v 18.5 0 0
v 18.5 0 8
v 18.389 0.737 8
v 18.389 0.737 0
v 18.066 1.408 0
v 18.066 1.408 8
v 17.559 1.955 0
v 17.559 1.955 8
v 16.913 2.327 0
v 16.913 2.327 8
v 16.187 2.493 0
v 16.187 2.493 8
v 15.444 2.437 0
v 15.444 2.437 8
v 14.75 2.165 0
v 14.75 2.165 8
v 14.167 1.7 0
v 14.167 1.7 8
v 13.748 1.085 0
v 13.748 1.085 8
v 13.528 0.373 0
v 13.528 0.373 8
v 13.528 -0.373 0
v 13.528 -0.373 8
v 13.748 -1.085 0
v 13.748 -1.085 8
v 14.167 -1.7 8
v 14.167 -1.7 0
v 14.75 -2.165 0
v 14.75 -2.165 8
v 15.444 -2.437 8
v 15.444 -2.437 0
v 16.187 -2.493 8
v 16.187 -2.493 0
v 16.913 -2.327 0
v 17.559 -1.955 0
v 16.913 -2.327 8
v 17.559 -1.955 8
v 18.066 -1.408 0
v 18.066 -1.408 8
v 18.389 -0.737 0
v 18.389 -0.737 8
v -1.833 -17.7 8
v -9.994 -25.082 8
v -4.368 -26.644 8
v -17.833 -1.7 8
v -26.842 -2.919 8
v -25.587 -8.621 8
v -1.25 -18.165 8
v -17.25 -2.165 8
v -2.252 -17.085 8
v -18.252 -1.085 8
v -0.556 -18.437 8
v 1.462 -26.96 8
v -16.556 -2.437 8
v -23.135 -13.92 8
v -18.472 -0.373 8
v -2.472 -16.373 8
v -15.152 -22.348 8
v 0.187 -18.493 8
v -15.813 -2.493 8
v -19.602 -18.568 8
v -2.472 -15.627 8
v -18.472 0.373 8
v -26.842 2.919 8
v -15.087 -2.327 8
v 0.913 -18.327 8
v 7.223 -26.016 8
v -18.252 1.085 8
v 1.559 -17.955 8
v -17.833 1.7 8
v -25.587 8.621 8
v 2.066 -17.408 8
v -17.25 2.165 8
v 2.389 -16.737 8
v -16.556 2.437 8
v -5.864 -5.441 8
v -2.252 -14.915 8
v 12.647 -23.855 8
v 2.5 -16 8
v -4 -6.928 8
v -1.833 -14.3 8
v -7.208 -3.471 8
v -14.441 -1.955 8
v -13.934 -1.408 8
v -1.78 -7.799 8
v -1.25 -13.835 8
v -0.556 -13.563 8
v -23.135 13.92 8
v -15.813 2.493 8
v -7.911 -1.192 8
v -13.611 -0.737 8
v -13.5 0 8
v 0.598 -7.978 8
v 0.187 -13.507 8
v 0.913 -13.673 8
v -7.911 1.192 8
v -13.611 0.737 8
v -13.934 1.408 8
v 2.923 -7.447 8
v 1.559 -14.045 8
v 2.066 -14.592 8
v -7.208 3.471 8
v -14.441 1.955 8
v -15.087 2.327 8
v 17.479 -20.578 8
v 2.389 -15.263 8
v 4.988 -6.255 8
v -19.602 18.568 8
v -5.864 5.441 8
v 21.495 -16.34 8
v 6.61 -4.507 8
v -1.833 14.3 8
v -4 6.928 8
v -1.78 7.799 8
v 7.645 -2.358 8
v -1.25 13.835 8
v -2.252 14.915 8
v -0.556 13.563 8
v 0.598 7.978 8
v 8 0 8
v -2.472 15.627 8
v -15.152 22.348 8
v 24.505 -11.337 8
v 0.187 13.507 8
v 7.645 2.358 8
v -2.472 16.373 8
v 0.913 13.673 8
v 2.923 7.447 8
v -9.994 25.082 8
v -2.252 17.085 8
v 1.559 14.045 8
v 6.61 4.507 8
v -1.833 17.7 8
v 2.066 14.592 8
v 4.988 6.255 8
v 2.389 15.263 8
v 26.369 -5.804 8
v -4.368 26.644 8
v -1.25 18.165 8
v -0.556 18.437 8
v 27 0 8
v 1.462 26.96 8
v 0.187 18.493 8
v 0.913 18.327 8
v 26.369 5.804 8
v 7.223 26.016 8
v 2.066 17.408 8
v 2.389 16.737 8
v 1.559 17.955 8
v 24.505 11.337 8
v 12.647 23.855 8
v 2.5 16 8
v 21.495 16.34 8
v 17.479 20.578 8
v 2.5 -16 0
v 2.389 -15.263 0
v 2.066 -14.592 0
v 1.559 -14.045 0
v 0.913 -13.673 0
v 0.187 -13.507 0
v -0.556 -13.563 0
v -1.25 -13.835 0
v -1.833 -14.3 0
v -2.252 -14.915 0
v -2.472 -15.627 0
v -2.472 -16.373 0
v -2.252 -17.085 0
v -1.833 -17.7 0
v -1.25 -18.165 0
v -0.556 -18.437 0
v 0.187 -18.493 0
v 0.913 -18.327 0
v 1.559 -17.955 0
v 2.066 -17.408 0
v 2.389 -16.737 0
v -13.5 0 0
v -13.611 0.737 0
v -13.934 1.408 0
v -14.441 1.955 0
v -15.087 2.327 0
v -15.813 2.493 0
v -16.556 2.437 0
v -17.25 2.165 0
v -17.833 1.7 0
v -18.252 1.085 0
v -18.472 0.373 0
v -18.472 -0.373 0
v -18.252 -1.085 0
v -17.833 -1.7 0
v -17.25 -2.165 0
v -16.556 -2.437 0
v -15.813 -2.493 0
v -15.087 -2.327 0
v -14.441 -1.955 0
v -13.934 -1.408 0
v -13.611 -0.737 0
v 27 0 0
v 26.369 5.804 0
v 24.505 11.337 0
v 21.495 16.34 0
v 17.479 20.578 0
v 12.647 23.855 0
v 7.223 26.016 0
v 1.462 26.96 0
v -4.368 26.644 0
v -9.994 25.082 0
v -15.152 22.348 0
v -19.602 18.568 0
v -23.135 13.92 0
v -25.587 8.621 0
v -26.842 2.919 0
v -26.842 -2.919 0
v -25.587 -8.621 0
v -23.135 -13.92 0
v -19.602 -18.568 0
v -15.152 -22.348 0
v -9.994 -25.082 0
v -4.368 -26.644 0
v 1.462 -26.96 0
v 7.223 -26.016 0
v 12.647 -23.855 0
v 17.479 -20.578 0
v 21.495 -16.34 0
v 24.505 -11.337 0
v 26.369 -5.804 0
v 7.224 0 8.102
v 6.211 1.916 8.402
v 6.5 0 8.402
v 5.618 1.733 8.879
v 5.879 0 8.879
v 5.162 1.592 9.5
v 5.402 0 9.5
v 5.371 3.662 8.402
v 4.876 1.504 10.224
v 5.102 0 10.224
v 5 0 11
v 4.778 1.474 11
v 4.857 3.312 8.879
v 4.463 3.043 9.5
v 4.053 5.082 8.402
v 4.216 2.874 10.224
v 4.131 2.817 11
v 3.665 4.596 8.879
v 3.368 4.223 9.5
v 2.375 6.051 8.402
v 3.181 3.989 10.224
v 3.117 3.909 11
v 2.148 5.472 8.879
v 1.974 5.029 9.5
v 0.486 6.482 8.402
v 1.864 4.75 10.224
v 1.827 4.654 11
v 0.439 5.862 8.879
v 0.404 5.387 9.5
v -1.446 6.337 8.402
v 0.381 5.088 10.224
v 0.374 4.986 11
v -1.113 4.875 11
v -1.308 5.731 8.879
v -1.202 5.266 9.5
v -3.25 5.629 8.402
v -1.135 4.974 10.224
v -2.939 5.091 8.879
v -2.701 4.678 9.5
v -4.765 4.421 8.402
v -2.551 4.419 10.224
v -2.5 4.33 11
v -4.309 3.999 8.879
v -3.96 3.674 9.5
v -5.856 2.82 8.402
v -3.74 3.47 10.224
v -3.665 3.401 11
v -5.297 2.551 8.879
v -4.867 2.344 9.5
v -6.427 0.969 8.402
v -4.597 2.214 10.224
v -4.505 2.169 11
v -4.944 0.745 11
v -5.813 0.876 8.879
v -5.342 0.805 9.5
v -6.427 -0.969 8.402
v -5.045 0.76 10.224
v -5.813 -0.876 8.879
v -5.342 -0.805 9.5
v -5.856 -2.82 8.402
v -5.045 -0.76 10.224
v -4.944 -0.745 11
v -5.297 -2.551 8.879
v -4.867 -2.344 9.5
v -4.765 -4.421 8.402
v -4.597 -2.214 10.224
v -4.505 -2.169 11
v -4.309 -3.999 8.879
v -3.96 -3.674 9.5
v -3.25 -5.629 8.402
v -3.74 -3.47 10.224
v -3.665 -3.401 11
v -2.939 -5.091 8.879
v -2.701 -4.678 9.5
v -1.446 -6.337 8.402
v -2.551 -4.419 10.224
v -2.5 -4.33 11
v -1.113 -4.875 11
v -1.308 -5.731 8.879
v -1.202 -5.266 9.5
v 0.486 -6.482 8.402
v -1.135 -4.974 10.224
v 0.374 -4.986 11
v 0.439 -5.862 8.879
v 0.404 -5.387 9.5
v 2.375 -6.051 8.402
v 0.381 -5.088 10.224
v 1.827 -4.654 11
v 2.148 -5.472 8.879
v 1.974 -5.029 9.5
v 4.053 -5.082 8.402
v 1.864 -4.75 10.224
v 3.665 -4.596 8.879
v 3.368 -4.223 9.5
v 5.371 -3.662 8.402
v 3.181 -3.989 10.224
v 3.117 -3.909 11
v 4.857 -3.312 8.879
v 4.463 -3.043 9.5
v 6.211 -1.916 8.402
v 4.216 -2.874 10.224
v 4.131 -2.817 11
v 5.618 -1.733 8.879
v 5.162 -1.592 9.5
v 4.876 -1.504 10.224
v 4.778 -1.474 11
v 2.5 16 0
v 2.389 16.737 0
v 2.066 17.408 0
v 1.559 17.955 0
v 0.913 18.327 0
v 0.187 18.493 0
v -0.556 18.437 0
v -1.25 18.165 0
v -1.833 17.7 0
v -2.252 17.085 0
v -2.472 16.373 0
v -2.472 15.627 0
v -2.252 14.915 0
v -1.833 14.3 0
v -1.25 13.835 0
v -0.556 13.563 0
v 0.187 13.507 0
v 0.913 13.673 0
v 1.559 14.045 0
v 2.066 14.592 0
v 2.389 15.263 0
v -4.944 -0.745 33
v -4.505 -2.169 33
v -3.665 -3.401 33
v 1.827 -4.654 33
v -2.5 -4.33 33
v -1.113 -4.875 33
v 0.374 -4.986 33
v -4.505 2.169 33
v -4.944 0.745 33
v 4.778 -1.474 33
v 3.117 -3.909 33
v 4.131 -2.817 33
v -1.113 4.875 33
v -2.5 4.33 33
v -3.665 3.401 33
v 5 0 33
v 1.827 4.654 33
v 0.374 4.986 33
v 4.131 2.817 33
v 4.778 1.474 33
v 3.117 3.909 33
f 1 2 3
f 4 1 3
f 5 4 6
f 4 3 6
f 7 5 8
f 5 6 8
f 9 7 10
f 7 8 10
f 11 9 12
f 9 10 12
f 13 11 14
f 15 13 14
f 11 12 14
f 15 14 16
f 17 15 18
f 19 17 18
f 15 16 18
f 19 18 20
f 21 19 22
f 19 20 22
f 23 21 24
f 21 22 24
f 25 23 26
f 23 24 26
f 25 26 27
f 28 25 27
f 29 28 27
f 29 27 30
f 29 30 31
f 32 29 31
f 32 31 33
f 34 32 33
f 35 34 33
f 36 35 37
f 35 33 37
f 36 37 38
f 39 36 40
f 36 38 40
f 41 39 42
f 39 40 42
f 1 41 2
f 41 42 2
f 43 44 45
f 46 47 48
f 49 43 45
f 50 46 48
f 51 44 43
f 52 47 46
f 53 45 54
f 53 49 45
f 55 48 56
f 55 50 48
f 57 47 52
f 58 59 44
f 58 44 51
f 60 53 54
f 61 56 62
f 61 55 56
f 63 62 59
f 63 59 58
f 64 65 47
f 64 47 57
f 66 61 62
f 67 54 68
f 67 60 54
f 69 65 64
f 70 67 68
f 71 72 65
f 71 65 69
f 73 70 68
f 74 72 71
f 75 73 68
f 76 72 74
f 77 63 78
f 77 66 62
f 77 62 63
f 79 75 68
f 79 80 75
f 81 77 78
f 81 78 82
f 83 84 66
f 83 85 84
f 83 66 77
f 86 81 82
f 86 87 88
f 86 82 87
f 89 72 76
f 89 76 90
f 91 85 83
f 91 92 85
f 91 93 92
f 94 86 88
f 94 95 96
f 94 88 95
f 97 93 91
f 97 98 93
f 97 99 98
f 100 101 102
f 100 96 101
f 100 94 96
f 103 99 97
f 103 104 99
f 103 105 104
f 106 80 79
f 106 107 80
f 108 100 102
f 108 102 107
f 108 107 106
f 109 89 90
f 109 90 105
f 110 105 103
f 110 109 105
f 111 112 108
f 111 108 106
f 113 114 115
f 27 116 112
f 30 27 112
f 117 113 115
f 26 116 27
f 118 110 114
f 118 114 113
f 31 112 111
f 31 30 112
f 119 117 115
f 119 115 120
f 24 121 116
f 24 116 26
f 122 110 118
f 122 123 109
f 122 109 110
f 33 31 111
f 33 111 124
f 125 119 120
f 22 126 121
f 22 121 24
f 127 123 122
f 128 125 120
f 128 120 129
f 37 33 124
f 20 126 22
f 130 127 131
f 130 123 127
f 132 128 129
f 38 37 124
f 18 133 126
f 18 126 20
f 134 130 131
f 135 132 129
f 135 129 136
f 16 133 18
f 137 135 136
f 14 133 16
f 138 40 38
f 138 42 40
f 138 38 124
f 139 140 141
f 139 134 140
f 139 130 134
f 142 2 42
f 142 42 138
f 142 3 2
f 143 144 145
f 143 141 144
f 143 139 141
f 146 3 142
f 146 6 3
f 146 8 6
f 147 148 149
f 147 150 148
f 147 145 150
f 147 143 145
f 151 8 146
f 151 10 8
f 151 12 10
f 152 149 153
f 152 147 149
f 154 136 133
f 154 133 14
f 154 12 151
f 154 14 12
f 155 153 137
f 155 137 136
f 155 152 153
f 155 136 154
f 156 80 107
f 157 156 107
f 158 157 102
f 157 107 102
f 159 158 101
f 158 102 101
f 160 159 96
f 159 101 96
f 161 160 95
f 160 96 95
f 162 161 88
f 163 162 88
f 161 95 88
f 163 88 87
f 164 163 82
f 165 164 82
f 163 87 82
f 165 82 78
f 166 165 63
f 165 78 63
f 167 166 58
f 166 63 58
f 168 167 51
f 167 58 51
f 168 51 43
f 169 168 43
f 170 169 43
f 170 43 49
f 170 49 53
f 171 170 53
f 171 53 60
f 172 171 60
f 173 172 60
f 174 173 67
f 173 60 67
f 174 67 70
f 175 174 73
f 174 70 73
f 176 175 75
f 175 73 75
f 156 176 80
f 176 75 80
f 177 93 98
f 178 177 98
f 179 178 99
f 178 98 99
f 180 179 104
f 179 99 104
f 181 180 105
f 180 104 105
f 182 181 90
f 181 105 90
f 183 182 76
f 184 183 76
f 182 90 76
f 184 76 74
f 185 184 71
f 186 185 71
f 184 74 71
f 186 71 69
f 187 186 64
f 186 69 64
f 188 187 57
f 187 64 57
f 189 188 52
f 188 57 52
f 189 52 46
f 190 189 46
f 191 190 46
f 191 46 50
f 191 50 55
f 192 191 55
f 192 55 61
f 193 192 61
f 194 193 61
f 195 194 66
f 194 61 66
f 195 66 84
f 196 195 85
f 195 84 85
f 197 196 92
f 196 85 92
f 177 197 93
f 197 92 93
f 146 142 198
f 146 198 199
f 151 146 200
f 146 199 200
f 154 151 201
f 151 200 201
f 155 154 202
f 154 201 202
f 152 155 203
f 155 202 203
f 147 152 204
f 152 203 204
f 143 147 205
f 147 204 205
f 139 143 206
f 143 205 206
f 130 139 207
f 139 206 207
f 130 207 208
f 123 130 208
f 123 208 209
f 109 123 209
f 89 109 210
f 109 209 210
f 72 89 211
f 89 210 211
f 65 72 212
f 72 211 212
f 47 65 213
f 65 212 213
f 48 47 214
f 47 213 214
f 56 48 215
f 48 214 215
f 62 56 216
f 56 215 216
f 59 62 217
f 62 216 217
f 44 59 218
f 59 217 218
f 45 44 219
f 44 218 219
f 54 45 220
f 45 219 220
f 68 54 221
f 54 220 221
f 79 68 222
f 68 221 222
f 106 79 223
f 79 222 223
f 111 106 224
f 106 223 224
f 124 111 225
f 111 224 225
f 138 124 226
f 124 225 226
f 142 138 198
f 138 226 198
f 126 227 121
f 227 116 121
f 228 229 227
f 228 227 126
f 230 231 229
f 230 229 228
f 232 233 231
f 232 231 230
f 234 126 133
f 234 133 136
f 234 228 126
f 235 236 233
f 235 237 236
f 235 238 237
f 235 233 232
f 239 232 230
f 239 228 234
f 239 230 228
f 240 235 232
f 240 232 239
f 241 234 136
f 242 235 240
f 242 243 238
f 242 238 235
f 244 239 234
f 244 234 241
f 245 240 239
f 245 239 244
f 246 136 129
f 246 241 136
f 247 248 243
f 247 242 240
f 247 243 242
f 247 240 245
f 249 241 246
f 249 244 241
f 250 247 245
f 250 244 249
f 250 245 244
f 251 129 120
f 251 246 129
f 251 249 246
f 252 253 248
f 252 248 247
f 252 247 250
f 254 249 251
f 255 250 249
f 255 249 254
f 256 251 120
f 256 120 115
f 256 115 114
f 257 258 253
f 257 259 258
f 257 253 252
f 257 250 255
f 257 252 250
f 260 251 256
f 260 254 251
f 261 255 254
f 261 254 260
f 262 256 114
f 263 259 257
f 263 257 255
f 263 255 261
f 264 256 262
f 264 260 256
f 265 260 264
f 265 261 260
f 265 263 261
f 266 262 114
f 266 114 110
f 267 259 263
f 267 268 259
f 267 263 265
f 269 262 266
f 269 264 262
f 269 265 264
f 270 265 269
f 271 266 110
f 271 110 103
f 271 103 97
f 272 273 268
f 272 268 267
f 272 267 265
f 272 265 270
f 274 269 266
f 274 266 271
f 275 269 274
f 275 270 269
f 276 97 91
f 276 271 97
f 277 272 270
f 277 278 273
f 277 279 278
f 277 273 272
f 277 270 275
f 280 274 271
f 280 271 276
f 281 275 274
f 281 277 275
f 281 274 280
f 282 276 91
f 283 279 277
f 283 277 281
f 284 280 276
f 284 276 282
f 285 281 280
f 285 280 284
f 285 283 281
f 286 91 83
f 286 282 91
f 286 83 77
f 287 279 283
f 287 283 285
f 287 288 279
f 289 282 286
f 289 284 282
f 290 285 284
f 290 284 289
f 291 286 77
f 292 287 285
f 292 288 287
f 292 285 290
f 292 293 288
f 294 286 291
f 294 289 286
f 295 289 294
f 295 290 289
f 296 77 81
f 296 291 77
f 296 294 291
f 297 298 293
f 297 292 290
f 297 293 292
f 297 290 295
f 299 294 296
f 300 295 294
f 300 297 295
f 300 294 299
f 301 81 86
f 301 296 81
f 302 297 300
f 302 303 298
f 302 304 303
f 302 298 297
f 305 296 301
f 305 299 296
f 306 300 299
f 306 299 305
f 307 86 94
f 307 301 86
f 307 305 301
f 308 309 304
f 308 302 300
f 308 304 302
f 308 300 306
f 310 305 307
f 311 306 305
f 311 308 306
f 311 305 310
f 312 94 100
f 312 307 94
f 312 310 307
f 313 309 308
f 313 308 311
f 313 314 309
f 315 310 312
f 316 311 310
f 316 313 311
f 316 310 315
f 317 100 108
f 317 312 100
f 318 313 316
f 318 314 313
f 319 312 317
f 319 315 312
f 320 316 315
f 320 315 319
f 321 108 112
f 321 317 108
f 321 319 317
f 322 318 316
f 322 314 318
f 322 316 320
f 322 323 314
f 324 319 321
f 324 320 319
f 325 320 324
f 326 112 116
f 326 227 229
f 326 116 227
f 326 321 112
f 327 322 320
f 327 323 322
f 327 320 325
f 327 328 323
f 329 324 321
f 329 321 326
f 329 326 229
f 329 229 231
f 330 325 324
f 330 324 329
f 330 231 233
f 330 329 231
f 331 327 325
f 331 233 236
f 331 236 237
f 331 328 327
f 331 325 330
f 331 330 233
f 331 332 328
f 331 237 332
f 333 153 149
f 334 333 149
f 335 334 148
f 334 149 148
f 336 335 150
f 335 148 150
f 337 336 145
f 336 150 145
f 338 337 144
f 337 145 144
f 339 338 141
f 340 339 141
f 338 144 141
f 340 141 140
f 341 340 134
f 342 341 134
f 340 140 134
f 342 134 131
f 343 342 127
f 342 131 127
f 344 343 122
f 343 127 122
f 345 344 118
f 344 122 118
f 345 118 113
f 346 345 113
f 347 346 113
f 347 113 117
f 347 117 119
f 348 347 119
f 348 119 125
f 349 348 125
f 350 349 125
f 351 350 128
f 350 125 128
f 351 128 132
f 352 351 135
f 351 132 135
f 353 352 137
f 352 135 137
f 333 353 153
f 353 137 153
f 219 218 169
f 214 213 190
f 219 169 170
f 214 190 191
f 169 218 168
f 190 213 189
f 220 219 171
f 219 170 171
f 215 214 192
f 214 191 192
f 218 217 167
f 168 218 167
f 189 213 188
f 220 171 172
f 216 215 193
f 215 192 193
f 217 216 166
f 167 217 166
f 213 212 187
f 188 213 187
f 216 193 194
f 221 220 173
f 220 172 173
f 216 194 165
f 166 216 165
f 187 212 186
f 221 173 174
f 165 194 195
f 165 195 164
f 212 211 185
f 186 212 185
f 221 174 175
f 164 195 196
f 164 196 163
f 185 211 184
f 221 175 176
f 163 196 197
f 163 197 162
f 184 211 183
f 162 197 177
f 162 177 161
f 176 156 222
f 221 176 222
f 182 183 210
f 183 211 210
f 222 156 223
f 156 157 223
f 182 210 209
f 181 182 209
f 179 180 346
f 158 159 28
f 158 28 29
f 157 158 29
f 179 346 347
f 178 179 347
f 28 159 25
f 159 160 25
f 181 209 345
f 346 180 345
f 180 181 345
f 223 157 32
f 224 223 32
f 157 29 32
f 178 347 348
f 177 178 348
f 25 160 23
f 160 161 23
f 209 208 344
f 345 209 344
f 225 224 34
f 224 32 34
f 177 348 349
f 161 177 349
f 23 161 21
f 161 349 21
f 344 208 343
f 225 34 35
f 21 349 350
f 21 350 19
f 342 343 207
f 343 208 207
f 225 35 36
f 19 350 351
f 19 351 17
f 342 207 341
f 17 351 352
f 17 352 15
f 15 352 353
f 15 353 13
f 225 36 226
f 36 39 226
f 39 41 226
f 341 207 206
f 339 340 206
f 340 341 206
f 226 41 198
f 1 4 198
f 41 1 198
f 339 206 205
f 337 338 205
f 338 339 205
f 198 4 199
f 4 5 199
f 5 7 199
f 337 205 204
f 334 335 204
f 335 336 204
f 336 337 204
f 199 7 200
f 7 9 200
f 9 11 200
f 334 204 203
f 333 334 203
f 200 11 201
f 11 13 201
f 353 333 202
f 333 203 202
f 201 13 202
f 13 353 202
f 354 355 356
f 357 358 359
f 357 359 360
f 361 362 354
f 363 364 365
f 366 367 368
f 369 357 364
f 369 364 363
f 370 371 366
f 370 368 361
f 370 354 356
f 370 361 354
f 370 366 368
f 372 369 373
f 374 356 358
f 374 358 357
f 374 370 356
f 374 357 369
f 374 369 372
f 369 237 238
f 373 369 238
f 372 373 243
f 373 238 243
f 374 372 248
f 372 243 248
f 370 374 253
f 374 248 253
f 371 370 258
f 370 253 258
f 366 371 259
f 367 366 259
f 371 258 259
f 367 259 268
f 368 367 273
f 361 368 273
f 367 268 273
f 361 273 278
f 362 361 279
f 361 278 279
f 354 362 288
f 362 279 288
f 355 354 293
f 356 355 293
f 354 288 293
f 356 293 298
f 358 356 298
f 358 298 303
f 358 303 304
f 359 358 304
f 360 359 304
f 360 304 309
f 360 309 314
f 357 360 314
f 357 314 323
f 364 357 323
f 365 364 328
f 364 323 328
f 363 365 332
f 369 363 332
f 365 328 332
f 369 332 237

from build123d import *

# Parameters (mm, degrees)
SKETCH1_R           = 27
BOSS_EXTRUDE1_DEPTH = 8
SKETCH2_R           = 2.5
CUT_EXTRUDE1_DEPTH  = 8
SKETCH3_R           = 5
BOSS_EXTRUDE2_DEPTH = 25
FILLET1_R           = 3


with BuildPart() as part:
    # Sketch1 → Boss-Extrude1 (new body)
    with BuildSketch(Plane.XY):
        Circle(SKETCH1_R)
    extrude(amount=BOSS_EXTRUDE1_DEPTH)

    # Sketch2 → Cut-Extrude1 (cut)
    with BuildSketch(Plane.XY.offset(8)):
        with Locations((-16, 0)):
            Circle(SKETCH2_R)
        with Locations((0, 16)):
            Circle(SKETCH2_R)
        with Locations((16, 0)):
            Circle(SKETCH2_R)
        with Locations((0, -16)):
            Circle(SKETCH2_R)
    extrude(amount=-CUT_EXTRUDE1_DEPTH, mode=Mode.SUBTRACT)

    # Sketch3 → Boss-Extrude2 (add)
    with BuildSketch(Plane.XY.offset(8)):
        Circle(SKETCH3_R)
    extrude(amount=BOSS_EXTRUDE2_DEPTH)

    # Fillet1
    fillet1_edges = [part.edges().sort_by_distance(p)[0] for p in [
        (-5, 0, 8),
    ]]
    fillet(fillet1_edges, radius=FILLET1_R)


solid = part.part
